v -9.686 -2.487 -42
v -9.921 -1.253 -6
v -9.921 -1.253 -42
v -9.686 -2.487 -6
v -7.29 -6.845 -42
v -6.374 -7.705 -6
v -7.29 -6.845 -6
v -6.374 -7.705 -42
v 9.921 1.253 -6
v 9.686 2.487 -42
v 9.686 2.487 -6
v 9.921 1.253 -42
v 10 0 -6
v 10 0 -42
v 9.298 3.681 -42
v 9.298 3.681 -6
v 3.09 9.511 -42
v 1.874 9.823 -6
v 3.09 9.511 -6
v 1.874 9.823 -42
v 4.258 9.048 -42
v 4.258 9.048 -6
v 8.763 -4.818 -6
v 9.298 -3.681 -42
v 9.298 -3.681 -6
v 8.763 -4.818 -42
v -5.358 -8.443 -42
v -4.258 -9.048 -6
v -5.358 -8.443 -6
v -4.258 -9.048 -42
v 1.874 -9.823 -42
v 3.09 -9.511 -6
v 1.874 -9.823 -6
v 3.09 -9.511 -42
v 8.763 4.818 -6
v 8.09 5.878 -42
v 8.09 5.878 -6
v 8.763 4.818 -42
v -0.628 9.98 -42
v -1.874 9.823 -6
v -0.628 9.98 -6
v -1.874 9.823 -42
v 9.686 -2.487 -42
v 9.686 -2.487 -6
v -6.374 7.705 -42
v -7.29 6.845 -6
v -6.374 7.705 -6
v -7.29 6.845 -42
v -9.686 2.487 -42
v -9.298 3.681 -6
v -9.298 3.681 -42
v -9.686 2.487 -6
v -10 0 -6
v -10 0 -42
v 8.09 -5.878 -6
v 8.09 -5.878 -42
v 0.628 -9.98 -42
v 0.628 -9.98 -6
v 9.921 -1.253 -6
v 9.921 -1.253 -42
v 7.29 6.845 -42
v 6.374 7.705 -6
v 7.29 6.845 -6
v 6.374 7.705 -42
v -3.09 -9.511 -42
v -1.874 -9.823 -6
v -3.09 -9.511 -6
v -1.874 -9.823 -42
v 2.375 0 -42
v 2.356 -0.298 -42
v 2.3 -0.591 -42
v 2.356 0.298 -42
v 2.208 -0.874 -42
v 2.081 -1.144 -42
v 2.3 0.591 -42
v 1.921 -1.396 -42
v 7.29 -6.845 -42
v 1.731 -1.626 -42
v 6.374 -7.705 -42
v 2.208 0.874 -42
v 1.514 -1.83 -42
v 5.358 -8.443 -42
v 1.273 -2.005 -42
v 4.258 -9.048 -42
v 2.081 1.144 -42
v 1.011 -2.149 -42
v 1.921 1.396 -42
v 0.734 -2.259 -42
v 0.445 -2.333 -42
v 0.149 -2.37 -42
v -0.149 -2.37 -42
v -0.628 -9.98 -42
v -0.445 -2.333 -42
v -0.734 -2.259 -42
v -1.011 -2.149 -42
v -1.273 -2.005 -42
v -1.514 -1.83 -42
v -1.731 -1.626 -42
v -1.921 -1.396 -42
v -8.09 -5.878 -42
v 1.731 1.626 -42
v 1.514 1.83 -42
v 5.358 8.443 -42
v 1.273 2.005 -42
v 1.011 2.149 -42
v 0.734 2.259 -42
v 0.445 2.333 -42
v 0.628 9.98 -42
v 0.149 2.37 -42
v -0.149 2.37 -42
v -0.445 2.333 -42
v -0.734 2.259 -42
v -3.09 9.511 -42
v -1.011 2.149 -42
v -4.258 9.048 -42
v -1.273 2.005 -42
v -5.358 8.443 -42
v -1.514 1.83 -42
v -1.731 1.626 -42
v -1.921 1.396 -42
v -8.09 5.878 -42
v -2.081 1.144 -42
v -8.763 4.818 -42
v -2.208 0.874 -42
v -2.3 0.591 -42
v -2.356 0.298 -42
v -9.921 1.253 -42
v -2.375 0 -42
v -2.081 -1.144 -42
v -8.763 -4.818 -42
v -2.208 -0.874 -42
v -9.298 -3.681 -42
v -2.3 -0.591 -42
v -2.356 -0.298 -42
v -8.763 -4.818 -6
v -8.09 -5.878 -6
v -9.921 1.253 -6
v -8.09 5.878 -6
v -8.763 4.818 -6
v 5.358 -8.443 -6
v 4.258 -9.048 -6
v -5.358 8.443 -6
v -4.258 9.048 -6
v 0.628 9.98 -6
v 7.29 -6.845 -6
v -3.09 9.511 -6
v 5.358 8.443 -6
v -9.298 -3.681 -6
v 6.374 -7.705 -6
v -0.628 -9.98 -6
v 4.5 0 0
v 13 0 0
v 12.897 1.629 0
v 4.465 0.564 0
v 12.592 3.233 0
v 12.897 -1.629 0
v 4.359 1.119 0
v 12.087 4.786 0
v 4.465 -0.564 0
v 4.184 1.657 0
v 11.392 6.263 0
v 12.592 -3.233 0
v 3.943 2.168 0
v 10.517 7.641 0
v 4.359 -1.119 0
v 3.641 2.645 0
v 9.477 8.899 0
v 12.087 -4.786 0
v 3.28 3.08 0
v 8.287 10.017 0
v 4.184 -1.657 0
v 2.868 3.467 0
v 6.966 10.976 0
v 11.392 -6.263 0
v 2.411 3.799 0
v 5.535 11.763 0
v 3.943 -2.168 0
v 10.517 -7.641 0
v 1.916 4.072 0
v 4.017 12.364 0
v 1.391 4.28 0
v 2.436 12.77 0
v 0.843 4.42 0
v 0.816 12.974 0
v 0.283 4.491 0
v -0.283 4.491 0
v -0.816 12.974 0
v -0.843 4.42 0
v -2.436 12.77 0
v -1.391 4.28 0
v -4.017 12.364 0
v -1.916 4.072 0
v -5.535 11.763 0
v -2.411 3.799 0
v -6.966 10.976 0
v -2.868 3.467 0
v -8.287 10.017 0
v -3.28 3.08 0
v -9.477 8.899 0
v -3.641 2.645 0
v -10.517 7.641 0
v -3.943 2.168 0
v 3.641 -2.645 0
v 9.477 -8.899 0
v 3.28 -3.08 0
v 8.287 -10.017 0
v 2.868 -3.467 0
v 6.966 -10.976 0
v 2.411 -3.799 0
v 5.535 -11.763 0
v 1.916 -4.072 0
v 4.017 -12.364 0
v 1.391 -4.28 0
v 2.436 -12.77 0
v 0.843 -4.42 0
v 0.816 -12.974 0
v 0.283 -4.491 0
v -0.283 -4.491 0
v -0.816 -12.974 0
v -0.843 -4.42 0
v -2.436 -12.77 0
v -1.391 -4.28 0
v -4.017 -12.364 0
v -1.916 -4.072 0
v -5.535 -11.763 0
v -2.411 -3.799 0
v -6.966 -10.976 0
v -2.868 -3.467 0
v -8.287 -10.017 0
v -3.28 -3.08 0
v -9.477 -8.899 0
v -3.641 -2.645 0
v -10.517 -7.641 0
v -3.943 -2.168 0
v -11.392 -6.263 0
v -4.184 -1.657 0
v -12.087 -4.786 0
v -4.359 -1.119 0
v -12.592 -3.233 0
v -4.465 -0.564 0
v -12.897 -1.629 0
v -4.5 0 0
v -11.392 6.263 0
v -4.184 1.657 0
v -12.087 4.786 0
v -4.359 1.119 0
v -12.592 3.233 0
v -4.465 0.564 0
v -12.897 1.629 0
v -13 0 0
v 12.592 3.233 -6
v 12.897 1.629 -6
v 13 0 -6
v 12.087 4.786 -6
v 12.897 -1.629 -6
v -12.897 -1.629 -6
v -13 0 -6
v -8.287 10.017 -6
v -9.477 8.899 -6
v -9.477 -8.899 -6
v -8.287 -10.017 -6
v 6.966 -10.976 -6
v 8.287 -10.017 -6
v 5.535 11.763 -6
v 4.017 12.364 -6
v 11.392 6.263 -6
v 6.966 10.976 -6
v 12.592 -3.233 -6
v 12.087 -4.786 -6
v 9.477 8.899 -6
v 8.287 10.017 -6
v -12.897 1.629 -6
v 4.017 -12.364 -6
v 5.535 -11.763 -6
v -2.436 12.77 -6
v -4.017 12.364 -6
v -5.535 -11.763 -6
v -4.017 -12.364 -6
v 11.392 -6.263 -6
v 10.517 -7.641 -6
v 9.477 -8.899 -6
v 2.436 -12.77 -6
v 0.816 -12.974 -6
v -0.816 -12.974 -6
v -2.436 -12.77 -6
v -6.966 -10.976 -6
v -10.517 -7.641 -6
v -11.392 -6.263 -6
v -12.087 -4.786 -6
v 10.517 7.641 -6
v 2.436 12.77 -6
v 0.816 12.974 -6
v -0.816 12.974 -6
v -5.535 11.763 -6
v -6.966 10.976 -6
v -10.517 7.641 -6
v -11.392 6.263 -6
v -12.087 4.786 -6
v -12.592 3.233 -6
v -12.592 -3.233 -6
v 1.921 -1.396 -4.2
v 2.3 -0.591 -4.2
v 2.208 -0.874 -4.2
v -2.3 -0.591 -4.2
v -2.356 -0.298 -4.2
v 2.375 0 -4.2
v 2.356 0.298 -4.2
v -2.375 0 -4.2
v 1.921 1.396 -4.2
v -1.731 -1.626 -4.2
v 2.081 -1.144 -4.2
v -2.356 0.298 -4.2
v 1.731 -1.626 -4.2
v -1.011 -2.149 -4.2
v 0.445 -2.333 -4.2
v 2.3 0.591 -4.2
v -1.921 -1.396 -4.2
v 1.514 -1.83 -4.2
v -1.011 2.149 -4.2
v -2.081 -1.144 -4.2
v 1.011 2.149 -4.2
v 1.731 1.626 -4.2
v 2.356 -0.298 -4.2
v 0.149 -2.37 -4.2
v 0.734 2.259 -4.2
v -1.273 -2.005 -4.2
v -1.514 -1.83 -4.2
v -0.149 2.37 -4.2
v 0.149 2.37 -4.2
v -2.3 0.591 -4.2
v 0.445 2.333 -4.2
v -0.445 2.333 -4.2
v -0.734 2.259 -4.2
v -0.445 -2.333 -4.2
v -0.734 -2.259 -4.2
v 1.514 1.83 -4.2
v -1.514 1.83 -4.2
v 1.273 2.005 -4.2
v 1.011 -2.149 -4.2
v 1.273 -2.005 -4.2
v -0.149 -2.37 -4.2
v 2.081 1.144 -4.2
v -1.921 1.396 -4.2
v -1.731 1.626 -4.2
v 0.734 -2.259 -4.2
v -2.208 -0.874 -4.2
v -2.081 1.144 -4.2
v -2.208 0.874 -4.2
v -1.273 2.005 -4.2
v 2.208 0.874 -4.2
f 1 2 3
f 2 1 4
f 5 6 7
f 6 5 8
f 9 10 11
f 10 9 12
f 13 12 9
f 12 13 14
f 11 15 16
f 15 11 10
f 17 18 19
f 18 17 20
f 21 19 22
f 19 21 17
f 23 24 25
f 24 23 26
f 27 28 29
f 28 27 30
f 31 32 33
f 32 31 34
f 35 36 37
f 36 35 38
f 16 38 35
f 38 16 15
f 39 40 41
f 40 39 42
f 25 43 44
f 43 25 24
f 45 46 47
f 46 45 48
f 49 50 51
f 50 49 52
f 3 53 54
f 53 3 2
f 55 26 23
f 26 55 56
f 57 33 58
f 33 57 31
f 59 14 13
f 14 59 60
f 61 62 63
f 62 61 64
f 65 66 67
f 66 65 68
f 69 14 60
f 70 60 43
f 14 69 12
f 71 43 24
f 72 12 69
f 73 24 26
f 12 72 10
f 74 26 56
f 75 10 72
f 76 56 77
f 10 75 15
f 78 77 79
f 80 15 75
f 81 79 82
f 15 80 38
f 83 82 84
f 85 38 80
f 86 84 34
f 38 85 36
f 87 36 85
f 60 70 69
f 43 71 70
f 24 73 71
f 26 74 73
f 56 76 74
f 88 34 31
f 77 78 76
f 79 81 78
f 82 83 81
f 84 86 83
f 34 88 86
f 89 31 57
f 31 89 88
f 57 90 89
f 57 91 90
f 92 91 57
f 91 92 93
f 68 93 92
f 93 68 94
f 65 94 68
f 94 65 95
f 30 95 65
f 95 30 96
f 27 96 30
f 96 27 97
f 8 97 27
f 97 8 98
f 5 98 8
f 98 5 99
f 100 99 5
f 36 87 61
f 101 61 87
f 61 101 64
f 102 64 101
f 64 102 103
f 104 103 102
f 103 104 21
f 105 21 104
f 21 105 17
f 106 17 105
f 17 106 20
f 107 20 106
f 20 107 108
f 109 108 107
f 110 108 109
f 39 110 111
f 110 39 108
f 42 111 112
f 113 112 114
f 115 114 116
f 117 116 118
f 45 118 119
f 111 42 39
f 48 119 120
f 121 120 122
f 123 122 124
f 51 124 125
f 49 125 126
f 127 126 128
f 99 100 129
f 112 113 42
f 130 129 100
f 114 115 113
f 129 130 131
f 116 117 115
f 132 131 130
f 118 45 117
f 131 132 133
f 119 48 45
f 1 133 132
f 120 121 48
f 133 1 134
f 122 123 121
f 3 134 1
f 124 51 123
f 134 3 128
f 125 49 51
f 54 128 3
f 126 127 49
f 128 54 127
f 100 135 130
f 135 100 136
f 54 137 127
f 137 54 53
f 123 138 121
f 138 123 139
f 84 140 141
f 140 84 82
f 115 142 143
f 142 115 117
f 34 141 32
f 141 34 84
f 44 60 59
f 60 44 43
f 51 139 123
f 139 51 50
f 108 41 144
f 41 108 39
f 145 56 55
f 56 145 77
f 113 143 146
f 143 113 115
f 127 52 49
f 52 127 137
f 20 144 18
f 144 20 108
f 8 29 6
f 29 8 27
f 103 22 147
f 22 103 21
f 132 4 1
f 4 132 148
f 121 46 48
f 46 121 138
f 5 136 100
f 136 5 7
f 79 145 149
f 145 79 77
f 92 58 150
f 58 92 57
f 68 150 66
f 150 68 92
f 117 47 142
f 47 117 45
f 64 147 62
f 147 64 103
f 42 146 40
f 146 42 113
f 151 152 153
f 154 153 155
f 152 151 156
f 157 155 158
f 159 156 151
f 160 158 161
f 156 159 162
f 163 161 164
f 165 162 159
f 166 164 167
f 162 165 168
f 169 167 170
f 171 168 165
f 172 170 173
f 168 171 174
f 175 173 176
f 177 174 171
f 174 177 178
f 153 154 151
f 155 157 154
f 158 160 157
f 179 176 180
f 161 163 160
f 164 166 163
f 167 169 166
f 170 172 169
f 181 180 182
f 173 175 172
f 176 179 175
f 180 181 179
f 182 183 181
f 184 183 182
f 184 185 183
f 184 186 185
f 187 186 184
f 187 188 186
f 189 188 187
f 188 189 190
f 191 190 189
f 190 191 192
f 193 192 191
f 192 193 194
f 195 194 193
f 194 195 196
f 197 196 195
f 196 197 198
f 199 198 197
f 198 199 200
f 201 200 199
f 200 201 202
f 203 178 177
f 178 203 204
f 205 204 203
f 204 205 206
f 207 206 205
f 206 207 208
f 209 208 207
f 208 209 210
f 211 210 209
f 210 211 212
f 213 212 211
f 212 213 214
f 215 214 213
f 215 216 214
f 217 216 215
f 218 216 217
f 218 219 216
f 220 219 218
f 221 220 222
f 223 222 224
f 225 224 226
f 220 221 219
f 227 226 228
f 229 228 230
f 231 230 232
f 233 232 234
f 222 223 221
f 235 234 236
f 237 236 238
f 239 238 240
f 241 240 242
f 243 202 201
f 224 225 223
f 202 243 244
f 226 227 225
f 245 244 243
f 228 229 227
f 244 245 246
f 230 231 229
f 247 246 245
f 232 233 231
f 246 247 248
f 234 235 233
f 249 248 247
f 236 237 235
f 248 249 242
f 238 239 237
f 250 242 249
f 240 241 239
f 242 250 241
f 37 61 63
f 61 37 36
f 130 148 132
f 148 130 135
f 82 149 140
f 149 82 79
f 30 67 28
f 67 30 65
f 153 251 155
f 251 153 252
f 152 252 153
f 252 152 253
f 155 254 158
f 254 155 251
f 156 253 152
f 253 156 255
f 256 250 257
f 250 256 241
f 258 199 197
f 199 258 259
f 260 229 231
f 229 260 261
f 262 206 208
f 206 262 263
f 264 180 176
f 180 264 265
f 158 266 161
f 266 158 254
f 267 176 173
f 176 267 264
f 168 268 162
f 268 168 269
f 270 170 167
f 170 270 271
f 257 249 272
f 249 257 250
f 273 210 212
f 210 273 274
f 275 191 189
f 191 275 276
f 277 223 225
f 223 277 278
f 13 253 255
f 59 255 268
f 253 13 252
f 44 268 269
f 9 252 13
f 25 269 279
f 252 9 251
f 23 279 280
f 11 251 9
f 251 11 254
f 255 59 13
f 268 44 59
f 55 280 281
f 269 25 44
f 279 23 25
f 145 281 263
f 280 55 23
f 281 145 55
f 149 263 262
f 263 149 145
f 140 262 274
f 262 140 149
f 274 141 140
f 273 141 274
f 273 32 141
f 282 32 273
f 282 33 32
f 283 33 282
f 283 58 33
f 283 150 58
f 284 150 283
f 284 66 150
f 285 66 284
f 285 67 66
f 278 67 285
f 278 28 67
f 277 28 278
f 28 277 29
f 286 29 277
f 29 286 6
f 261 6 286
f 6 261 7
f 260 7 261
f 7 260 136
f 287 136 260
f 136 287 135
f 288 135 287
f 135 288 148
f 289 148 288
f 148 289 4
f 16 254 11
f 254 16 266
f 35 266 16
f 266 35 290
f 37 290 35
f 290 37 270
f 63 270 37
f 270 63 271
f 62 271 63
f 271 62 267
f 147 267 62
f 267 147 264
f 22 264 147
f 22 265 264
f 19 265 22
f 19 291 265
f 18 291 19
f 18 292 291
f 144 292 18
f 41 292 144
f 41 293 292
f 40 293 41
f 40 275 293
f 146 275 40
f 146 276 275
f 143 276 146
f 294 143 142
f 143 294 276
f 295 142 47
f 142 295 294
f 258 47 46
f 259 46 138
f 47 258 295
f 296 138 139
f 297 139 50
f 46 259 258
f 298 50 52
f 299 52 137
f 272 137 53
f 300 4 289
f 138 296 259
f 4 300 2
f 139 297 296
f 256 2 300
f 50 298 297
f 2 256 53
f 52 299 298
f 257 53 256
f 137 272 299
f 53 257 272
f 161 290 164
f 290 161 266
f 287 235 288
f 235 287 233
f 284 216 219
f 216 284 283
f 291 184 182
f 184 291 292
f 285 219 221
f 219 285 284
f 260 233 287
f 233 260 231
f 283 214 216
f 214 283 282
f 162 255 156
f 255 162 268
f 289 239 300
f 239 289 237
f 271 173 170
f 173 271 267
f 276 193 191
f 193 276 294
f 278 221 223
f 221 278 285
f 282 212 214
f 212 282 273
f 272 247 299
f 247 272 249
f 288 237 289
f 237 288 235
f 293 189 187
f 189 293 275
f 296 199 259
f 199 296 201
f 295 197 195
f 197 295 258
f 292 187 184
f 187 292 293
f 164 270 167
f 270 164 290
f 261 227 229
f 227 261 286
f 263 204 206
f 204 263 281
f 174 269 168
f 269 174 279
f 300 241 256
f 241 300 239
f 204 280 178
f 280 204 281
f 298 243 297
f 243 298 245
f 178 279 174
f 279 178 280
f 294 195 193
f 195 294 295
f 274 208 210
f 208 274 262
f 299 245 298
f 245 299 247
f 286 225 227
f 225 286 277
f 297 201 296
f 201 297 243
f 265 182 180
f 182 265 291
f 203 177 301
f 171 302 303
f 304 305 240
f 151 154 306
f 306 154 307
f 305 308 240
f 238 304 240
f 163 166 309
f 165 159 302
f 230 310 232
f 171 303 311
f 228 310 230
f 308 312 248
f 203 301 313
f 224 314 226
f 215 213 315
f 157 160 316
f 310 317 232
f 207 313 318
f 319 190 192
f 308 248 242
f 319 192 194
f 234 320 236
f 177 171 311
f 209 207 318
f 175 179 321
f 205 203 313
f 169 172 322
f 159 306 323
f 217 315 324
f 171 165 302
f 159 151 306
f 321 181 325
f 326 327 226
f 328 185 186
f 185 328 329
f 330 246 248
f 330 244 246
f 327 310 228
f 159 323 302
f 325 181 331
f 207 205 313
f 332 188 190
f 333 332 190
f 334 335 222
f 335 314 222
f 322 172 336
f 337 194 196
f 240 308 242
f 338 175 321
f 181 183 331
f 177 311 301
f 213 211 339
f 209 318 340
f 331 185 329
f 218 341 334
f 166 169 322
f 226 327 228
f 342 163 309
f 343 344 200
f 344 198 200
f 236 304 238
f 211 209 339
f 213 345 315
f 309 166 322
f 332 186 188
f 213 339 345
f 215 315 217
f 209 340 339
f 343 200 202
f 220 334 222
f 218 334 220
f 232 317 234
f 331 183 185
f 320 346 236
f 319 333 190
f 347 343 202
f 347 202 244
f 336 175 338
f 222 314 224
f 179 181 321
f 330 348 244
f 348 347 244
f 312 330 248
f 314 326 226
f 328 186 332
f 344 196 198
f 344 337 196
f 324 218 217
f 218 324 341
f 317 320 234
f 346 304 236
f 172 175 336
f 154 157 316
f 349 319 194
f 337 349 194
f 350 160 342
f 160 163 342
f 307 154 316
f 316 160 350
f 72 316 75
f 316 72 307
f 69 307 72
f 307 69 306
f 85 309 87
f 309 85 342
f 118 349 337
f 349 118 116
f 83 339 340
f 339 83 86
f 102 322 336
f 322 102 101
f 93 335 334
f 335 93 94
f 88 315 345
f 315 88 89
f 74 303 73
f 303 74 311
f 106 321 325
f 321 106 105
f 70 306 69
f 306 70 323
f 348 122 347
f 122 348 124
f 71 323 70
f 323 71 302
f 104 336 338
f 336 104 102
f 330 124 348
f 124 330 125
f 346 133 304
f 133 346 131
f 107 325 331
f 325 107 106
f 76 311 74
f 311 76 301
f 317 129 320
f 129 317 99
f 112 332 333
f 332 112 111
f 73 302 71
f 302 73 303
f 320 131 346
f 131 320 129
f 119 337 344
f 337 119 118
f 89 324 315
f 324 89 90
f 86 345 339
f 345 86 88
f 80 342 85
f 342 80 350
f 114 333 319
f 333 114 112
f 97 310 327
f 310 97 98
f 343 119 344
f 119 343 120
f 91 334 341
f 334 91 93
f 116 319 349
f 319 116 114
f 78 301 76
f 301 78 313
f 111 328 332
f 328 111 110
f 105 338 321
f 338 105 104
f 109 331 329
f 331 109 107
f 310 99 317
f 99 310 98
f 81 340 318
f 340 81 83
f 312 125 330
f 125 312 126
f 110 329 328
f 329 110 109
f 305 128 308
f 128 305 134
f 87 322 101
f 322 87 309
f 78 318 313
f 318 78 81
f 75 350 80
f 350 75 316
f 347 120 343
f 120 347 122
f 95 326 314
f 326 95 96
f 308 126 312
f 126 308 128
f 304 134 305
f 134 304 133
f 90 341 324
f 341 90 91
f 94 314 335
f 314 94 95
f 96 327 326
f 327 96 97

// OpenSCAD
$fn = 50;


difference() {
	union() {
		translate(v = [0, 0, -42.0000000000]) {
			cylinder(h = 42, r = 10.0000000000);
		}
		translate(v = [0, 0, -6.0000000000]) {
			cylinder(h = 6, r = 13.0000000000);
		}
	}
	union() {
		translate(v = [0, 0, 0]) {
			rotate(a = [0, 0, 0]) {
				difference() {
					union() {
						#translate(v = [0, 0, -42.0000000000]) {
							cylinder(h = 42, r = 2.2500000000);
						}
						#translate(v = [0, 0, -4.2000000000]) {
							cylinder(h = 4.2000000000, r = 10.0000000000, r1 = 2.3750000000, r2 = 4.5000000000);
						}
						#translate(v = [0, 0, -42.0000000000]) {
							cylinder(h = 42, r = 2.3750000000);
						}
						#translate(v = [0, 0, -42.0000000000]) {
							cylinder(h = 42, r = 2.2500000000);
						}
					}
					union();
				}
			}
		}
	}
}
